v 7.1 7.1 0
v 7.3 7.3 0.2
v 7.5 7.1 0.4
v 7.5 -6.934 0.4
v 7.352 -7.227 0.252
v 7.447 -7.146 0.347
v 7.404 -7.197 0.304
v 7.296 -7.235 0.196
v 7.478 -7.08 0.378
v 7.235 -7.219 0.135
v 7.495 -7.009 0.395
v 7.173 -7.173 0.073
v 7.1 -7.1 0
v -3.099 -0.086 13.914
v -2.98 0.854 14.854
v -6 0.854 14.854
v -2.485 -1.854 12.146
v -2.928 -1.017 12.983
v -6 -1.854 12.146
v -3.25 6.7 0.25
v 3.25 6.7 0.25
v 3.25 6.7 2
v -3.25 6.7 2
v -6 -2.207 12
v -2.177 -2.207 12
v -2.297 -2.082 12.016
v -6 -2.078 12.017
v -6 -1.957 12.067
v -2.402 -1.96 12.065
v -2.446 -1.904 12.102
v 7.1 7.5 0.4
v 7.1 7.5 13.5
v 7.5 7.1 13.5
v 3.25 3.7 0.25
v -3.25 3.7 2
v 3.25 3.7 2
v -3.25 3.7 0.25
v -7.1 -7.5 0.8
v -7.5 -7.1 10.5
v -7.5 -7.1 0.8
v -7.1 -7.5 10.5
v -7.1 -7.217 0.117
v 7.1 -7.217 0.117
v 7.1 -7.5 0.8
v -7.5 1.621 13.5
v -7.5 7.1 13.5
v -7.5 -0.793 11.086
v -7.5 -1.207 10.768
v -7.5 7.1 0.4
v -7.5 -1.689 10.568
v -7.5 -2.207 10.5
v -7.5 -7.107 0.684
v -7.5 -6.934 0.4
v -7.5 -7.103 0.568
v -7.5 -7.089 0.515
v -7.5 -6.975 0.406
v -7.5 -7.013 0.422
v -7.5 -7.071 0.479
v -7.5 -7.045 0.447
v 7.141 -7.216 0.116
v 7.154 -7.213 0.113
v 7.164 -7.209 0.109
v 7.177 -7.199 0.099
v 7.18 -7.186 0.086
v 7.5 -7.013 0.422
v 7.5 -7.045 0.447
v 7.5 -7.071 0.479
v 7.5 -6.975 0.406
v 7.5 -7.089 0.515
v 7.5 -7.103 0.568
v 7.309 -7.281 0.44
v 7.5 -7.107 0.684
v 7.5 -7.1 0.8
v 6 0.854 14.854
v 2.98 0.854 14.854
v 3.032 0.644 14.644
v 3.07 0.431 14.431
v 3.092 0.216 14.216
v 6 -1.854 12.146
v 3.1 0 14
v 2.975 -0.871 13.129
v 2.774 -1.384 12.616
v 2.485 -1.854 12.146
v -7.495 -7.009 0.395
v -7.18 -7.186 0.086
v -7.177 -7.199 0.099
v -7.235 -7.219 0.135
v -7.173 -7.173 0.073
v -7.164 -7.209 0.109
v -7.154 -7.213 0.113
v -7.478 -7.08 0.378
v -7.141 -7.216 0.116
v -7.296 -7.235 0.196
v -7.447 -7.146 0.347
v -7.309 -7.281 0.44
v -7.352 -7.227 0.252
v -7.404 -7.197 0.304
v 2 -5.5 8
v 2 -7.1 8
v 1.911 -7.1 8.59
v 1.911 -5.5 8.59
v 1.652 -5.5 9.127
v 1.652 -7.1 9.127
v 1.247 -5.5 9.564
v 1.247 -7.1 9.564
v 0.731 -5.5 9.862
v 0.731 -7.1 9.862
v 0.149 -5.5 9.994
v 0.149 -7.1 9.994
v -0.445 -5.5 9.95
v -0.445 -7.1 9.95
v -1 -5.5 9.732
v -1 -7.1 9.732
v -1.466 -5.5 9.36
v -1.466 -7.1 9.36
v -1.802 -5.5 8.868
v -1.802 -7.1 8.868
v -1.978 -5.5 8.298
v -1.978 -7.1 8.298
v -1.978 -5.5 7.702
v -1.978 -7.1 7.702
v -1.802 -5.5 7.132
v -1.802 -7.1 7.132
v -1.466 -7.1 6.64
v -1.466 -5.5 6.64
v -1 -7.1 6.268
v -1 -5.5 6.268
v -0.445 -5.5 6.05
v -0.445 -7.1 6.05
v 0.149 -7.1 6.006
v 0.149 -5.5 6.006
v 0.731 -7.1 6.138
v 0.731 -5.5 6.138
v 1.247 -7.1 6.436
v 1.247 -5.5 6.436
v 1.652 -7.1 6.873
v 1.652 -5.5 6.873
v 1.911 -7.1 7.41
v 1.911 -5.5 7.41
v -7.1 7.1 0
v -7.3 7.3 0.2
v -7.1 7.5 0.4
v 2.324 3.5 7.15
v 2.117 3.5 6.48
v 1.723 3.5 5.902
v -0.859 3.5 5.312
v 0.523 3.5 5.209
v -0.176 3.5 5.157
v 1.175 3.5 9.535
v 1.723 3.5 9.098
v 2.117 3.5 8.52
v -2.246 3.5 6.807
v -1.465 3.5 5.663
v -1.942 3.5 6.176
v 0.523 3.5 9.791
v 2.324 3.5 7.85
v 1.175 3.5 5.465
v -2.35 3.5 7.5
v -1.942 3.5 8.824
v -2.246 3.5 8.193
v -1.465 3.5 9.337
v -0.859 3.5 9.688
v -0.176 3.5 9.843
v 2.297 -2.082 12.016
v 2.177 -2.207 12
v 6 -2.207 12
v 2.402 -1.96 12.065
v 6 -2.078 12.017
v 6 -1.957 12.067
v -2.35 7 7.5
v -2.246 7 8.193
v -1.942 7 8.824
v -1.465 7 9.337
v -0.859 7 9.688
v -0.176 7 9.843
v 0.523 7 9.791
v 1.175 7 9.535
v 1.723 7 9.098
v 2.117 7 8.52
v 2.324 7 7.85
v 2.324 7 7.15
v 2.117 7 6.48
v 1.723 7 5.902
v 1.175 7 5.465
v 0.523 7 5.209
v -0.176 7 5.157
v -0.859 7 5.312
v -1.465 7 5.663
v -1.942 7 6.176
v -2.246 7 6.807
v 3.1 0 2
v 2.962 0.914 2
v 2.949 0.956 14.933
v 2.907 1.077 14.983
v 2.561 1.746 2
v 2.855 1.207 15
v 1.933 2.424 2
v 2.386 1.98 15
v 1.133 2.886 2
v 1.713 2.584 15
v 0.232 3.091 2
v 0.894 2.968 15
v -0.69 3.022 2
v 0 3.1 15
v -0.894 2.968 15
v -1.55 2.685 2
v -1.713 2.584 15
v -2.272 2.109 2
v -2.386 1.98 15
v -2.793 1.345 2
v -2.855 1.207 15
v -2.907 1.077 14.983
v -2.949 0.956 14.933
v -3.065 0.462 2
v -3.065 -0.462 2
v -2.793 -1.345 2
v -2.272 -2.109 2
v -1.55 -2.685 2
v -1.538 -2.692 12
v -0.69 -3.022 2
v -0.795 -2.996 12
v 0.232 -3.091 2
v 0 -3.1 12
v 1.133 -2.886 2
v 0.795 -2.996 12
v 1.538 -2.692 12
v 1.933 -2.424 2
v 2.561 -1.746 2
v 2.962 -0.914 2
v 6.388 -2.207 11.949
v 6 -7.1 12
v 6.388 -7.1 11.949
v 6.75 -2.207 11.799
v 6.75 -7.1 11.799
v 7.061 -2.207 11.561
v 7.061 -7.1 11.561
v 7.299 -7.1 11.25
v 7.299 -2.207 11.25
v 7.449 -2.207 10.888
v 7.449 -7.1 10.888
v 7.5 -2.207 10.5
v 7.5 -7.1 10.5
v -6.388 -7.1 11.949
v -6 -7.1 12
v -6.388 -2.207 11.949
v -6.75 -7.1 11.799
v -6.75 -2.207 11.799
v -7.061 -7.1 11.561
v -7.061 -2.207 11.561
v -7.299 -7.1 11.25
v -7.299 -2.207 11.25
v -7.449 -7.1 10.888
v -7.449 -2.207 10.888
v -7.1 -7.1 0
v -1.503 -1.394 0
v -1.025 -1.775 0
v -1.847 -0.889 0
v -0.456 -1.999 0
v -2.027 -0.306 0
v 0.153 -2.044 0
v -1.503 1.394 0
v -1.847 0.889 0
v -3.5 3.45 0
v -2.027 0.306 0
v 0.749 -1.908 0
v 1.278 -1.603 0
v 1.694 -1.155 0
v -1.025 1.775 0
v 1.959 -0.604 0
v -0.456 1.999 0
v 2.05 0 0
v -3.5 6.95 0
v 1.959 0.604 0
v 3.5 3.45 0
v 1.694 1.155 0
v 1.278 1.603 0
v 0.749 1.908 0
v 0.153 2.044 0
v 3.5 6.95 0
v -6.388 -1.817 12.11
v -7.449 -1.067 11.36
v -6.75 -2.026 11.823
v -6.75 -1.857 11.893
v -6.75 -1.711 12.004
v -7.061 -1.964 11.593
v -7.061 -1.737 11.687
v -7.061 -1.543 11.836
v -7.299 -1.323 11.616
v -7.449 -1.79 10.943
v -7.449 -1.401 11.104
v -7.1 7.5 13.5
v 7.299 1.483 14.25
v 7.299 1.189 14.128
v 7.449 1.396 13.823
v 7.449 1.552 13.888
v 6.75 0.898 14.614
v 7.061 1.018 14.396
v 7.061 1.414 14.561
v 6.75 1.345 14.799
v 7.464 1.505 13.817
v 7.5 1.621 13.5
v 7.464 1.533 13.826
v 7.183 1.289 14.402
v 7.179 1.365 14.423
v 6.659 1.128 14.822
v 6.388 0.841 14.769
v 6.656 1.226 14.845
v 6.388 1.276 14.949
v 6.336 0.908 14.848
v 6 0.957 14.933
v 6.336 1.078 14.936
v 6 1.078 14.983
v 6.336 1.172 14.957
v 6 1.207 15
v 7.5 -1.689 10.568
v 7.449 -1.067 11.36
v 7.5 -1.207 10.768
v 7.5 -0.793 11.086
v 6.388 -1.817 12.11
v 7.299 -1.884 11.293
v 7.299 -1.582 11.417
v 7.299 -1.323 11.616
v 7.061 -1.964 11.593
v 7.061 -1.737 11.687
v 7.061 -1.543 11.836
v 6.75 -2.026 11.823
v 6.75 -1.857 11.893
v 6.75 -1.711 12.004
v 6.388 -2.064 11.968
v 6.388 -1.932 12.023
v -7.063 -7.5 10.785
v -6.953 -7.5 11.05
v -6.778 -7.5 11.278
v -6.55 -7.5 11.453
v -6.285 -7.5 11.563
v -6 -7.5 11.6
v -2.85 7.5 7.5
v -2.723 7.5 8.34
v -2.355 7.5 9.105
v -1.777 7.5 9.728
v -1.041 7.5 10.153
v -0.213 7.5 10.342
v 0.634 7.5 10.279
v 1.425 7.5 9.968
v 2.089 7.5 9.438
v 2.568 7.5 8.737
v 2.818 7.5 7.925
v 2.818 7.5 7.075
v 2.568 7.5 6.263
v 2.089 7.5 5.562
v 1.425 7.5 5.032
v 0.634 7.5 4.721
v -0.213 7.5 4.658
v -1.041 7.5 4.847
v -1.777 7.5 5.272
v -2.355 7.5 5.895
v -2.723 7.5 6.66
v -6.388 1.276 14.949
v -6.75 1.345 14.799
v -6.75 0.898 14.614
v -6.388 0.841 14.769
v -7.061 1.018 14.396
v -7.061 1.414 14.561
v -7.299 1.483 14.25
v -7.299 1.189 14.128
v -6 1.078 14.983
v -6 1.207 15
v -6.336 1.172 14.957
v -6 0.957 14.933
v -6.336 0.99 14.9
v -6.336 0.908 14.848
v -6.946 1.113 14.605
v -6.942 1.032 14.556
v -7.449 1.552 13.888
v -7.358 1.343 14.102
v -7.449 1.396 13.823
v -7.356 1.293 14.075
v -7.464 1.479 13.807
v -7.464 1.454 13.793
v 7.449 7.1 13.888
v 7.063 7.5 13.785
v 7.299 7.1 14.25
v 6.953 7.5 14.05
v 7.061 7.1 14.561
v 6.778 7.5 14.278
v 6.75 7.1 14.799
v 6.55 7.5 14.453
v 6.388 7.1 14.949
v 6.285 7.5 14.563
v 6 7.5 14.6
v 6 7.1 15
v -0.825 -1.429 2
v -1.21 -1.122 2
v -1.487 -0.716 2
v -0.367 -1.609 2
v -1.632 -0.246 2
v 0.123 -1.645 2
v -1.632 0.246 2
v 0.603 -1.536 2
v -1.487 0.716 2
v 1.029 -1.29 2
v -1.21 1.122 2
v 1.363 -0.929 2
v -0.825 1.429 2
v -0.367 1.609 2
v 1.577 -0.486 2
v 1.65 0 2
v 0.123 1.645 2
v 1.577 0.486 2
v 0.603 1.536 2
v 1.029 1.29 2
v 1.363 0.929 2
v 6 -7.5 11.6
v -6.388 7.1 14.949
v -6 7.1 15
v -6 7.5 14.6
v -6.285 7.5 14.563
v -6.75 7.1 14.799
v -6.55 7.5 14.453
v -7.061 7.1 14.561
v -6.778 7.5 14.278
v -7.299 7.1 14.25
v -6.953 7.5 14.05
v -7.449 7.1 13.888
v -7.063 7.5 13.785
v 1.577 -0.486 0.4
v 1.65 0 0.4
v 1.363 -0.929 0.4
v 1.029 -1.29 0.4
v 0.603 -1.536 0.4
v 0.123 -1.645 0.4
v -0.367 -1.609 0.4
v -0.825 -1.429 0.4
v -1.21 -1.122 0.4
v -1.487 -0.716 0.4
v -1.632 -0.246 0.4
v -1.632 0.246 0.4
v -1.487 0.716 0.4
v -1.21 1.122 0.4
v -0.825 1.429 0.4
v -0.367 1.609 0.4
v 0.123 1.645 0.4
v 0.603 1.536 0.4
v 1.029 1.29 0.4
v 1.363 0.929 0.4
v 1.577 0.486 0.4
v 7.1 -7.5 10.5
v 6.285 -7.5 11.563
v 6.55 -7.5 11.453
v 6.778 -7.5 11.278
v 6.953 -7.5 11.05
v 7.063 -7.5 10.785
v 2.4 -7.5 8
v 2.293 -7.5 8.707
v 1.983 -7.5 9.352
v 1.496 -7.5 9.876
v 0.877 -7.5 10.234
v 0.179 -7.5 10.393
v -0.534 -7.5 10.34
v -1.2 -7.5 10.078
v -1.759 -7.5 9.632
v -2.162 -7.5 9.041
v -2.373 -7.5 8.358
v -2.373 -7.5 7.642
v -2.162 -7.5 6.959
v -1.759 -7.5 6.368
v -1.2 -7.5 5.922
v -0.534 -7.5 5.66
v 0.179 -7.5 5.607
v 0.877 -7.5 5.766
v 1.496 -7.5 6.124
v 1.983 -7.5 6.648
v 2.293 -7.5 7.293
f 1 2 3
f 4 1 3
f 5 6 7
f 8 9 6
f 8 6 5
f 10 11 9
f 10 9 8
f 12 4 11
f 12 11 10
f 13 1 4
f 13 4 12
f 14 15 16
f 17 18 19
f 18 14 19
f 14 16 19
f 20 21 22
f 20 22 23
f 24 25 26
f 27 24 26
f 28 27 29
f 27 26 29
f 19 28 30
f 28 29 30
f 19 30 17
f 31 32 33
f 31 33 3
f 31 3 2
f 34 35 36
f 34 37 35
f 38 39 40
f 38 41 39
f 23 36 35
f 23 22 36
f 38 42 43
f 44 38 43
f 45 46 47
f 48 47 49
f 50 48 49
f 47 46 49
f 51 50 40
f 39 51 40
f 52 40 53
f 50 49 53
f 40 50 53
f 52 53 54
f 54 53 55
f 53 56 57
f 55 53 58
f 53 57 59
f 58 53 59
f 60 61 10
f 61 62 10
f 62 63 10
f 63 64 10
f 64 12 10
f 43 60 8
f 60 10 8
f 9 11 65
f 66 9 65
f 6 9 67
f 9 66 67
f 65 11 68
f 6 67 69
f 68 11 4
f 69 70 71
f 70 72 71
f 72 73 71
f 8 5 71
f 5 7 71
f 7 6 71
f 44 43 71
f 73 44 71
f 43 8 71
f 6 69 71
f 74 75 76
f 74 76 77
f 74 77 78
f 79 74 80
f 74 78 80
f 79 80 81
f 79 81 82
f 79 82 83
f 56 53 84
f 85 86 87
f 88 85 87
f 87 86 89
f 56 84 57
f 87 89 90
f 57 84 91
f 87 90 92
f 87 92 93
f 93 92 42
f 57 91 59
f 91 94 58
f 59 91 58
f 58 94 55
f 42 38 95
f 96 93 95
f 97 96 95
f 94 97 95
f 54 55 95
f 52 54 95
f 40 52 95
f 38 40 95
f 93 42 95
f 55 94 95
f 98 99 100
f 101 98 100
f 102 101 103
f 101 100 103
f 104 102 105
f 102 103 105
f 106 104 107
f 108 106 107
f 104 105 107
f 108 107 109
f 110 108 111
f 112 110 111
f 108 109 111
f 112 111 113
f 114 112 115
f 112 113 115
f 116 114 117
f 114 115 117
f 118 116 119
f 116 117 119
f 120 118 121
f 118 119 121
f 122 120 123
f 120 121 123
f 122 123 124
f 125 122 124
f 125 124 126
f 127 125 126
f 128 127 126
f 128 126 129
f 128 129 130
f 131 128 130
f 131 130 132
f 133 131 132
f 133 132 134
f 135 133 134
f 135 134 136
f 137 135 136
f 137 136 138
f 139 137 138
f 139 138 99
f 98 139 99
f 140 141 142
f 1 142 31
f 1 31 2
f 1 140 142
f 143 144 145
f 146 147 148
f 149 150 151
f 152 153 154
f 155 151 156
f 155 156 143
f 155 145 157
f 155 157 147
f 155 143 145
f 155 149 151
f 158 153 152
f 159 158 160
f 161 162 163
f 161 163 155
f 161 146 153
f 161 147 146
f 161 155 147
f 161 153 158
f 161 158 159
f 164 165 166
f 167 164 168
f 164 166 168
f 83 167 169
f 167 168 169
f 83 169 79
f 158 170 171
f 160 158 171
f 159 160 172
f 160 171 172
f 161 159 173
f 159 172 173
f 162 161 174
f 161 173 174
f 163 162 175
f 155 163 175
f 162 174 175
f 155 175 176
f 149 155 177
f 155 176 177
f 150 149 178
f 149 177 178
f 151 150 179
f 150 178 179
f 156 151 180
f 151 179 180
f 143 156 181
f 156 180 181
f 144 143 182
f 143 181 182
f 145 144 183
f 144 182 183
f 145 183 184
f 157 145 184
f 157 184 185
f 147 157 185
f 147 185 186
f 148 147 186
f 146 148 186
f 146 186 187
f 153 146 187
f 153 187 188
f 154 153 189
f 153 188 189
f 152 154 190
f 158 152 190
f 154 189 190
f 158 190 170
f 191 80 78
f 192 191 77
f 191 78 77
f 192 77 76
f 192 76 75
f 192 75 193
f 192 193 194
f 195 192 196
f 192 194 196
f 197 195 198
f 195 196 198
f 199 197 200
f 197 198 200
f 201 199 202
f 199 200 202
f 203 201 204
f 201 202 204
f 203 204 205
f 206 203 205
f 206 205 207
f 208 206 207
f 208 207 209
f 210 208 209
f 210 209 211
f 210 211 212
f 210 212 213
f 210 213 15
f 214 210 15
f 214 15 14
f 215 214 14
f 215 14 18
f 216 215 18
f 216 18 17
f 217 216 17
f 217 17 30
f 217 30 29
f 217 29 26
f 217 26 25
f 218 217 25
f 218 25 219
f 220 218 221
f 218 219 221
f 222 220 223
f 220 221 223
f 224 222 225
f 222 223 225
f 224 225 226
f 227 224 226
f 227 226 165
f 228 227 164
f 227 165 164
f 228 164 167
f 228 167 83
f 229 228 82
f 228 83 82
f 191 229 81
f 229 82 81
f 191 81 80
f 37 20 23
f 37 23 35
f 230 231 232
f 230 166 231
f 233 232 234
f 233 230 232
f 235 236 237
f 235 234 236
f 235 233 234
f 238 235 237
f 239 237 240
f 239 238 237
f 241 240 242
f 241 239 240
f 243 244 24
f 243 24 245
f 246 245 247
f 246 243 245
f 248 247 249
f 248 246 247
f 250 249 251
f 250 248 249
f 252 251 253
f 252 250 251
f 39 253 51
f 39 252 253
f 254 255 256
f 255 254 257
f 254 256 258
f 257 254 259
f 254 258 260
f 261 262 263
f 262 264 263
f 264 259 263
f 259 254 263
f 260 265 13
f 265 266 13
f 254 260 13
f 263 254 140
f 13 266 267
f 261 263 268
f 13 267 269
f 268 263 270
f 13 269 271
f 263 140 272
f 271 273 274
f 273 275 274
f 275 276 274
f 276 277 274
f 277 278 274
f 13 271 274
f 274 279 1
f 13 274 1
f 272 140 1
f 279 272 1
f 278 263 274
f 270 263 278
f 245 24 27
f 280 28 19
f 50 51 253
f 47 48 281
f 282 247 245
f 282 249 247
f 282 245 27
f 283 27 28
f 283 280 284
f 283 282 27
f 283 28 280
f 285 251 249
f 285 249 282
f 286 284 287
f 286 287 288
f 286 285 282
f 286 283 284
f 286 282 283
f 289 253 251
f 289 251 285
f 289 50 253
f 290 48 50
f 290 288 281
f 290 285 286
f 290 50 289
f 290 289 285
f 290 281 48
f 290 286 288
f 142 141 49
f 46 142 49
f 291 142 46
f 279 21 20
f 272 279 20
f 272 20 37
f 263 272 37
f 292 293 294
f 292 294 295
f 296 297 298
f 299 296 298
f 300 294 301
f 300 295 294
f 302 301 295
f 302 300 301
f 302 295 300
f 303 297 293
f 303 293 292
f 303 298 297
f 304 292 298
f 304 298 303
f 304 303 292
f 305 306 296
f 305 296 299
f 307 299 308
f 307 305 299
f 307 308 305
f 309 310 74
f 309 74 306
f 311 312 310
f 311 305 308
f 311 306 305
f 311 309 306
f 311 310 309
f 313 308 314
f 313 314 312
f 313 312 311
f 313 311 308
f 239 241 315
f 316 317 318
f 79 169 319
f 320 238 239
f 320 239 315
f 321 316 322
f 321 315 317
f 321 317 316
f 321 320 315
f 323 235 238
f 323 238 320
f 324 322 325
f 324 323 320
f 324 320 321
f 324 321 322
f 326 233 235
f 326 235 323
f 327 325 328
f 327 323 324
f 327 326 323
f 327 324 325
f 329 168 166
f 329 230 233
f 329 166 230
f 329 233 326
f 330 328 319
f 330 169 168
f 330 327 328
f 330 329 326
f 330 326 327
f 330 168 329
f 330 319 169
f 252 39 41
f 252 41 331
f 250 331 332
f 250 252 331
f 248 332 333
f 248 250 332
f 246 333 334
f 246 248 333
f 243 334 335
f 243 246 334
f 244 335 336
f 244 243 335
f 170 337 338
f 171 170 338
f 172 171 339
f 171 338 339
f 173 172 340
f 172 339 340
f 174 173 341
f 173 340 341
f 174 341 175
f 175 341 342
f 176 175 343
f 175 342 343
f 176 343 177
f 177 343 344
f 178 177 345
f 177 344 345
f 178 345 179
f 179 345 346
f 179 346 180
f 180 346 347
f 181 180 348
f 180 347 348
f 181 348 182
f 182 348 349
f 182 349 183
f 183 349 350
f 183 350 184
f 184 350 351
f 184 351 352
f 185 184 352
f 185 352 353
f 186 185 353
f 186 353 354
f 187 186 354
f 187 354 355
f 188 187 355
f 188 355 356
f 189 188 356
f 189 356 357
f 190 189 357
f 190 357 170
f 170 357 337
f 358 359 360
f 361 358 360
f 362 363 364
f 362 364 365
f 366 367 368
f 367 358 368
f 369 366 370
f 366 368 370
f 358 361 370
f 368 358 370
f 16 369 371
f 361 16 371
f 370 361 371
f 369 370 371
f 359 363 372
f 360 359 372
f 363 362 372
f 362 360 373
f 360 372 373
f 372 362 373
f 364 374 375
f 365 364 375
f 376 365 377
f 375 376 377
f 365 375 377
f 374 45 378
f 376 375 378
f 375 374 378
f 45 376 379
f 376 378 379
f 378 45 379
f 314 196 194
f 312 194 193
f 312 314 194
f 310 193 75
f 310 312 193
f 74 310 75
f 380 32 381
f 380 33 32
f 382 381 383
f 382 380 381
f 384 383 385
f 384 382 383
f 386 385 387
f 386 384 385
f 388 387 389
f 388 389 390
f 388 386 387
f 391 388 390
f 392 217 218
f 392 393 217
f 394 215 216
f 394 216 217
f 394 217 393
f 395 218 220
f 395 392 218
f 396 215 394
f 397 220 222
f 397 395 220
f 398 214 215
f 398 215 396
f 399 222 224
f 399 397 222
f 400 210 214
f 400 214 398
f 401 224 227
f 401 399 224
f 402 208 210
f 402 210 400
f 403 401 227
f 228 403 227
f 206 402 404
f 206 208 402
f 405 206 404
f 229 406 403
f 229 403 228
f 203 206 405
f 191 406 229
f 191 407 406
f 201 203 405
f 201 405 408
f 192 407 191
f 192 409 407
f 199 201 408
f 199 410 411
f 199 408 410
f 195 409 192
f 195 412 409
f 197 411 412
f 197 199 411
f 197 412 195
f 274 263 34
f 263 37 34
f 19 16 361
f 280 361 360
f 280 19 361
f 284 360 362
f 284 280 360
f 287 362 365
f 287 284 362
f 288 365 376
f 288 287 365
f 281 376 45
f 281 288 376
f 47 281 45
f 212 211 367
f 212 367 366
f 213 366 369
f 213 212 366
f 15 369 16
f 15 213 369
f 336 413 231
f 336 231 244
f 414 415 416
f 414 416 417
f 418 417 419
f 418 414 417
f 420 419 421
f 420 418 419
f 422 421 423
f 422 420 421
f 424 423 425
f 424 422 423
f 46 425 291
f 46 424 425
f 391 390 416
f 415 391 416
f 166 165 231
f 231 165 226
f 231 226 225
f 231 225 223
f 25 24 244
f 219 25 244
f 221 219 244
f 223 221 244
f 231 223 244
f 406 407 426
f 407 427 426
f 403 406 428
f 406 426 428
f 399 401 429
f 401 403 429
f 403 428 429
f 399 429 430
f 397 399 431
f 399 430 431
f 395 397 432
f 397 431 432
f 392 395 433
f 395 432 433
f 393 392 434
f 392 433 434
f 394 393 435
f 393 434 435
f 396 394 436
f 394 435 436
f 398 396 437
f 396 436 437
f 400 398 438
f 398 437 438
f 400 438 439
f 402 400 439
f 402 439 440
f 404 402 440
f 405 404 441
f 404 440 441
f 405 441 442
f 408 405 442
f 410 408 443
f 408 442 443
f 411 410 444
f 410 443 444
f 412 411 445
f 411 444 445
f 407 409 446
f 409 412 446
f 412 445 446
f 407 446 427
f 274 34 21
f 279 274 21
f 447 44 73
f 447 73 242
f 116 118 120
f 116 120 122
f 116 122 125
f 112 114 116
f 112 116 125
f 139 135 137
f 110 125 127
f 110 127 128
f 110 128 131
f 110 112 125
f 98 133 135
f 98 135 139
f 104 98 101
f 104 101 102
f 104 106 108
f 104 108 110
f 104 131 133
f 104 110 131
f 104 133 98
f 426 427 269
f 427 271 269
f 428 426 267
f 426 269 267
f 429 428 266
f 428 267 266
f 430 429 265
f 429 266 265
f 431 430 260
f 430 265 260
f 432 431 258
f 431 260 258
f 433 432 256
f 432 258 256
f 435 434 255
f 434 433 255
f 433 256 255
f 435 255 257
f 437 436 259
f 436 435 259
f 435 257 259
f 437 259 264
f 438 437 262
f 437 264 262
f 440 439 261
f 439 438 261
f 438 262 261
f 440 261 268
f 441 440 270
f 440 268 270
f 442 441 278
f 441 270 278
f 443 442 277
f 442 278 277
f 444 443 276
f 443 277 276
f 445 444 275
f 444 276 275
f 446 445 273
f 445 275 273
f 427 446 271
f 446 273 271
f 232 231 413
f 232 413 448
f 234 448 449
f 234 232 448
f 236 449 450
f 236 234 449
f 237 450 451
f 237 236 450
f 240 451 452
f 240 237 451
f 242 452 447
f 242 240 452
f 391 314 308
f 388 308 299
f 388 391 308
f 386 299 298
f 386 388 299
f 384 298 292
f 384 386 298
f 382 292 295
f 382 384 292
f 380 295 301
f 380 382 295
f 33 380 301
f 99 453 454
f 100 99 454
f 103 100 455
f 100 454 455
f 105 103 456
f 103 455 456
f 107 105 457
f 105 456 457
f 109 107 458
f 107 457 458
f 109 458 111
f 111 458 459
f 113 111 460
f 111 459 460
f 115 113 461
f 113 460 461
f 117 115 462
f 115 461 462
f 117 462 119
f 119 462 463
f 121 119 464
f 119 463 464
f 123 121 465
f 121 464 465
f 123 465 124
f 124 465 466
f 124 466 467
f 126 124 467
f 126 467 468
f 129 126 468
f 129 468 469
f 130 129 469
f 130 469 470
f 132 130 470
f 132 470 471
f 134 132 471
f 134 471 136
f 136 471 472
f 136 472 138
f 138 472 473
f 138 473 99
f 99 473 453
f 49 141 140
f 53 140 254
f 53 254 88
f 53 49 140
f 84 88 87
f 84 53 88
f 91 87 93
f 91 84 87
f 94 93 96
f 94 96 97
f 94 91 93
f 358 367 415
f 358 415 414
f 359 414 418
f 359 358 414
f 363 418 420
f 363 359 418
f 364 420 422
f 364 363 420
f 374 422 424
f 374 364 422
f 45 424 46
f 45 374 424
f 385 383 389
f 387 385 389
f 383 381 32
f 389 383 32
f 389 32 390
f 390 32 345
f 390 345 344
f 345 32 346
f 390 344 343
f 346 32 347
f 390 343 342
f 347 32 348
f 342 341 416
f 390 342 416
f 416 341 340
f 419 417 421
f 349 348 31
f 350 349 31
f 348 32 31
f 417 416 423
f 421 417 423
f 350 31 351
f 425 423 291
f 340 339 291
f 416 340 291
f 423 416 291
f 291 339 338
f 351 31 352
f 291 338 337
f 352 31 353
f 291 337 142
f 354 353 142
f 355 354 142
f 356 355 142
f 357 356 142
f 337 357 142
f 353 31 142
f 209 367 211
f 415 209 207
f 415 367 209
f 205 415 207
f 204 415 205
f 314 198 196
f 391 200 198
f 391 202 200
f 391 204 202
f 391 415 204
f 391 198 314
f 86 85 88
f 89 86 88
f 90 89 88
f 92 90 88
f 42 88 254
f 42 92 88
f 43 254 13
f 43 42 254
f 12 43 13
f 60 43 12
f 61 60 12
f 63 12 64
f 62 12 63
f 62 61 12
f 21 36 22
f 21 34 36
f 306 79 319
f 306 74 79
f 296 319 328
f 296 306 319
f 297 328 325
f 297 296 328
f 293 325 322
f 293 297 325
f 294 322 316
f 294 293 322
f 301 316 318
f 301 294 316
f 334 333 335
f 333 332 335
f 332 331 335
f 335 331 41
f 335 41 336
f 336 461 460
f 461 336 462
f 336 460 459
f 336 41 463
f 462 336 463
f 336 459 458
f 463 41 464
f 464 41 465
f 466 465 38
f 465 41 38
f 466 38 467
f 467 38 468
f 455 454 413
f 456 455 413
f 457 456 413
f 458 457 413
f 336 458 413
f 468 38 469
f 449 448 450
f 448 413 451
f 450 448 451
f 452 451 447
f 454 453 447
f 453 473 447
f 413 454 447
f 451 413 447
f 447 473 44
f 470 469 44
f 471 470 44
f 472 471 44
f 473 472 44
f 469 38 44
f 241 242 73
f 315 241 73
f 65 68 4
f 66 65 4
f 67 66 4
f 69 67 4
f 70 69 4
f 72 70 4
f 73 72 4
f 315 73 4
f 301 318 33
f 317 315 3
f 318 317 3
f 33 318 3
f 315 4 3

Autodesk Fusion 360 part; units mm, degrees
sketch "Sketch1" plane through (0, 0, 0) normal (0, 0, 1) x (1, 0, 0)
  line L0 (7.5, 7.5) -> (-7.5, 7.5)
  line L1 (-7.5, 7.5) -> (-7.5, -7.5)
  line L2 (-7.5, -7.5) -> (7.5, -7.5)
  line L3 (7.5, -7.5) -> (7.5, 7.5)
  line L4 (7.5, 7.5) -> (-7.5, -7.5) construction
  line L5 (-7.5, 7.5) -> (7.5, -7.5) construction
  circle A0 centre (0, 0) radius 1.65
  circle A1 centre (0, 0) radius 3.1
  dimension "d1" = 15
  dimension "d2" = 15
  dimension "d3" = 3.3
  dimension "d9" = 6.2
extrude "Extrude1" add sketch "Sketch1" along normal blind 15 contours L0 L1 L2 L3 | A1
sketch "Sketch2" plane through (0, 7.5, 0) normal (0, 1, 0) x (-1, 0, 0)
  line L0 (-7.5, 0) -> (7.5, 0)
  line L1 (7.5, 0) -> (7.5, 15)
  line L2 (7.5, 15) -> (-7.5, 15)
  line L3 (-7.5, 15) -> (-7.5, 0)
  circle A0 centre (0, 7.5) radius 2.35
  dimension "d6" = 4.7
extrude "Extrude2" cut sketch "Sketch2" against normal blind 4 contours A0
sketch "Sketch3" plane through (0, 0, 15) normal (0, 0, 1) x (1, 0, 0)
  circle A0 centre (0, 0) radius 1.65
  line L0 (7.5, -7.5) -> (7.5, 7.5)
  line L1 (7.5, 7.5) -> (-7.5, 7.5)
  line L2 (-7.5, 7.5) -> (-7.5, -7.5)
  line L3 (-7.5, -7.5) -> (7.5, -7.5)
  circle A1 centre (0, 0) radius 3.1
extrude "Extrude3" cut sketch "Sketch3" against normal blind 13 contours A1
sketch "Sketch4" plane through (-7.5, 0, 0) normal (-1, 0, 0) x (0, 0, 1)
  line L0 (0, 7.5) -> (0, -7.5)
  line L1 (0, -7.5) -> (15, -7.5)
  line L2 (15, -7.5) -> (15, 7.5)
  line L3 (15, 7.5) -> (0, 7.5)
  line L4 (15, 1) -> (12, -2)
  line L5 (0, -7.5) -> (12, -7.5)
  line L6 (15, 1) -> (15, 7.5)
  line L7 (5.15, 3.5) -> (9.85, 3.5)
  line L8 (5.15, 7.5) -> (9.85, 7.5)
  line L9 (12, -4) -> (0, -4)
  line L10 (12, -2) -> (12, -4)
  line L11 (12, -4) -> (12, -7.5)
  dimension "d12" = 12
  dimension "d20" = 3
  dimension "d21" = 3.5
  dimension "d22" = 135
  dimension "d23" = 5.5
extrude "Extrude4" cut sketch "Sketch4" against normal blind 186 contours L1 L2 L4 L10 L11
fillet "Fillet1" radius 0.5 4 edges at (-5.2171, 1, 15) (5.2171, 1, 15) (4.9343, -2, 12) (-4.9343, -2, 12)
fillet "Fillet2" radius 1.5 10 edges at (7.5, 4.3536, 15) (7.5, 1.0158, 14.9619) (7.5, -0.5, 13.5) (7.5, -2.0158, 12.0381) (7.5, -4.8536, 12) (-7.5, 4.3536, 15) (-7.5, 1.0158, 14.9619) (-7.5, -0.5, 13.5) (-7.5, -2.0158, 12.0381) (-7.5, -4.8536, 12)
chamfer "Chamfer2" distance 0.5 angle 45 1 edges at (2.191, 7.5, 8.3498)
chamfer "Chamfer1" distance 0.4 angle 45 1 faces at (0.0411, -5.5485, 0)
chamfer "Chamfer3" distance 0.4 angle 45 1 faces at (2, -7.5, 4.2667)
sketch "Sketch5" plane through (0, -7.5, 0) normal (0, -1, 0) x (1, 0, 0)
  line L0 (7.1, 0.8) -> (7.1, 10.5)
  line L1 (-7.1, 10.5) -> (-7.1, 0.8)
  line L2 (-7.1, 0.8) -> (7.1, 0.8)
  circle A0 centre (0, 8) radius 2
  line L3 (-7.1, 0) -> (7.1, 0)
  arc A1 (7.1, 10.5) -> (6, 11.6) centre (6, 10.5) ccw
  line L4 (6, 11.6) -> (-6, 11.6)
  arc A2 (-6, 11.6) -> (-7.1, 10.5) centre (-6, 10.5) ccw
  line L5 (6, 12) -> (-6, 12)
  dimension "d28" = 8
  dimension "d29" = 4
  dimension "d34" = 4
extrude "Extrude5" cut sketch "Sketch5" against normal blind 2 contours A0
chamfer "Chamfer4" distance 0.4 angle 45 6 edges at (-1.8647, -7.5, 8.7232) (7.5, 7.5, 6.95) (7.0607, 7.5, 14.5607) (0, 7.5, 15) (-7.0607, 7.5, 14.5607) (-7.5, 7.5, 6.95)
sketch "Sketch6" plane through (0, 0, 0) normal (0, 0, -1) x (-1, 0, 0)
  circle A0 centre (0, 0) radius 2.05
  line L0 (-7.1, 7.1) -> (-7.1, -7.1)
  line L1 (-7.1, -7.1) -> (7.1, -7.1)
  line L2 (7.1, -7.1) -> (7.1, 7.1)
  line L3 (7.1, 7.1) -> (-7.1, 7.1)
  line L4 (-3.25, 6.7) -> (3.25, 6.7)
  line L5 (3.25, 6.7) -> (3.25, 3.7)
  line L6 (3.25, 3.7) -> (-3.25, 3.7)
  line L7 (-3.25, 3.7) -> (-3.25, 6.7)
  line L8 (-7.5, 7.1) -> (-7.5, -7.1)
  line L9 (7.1, 7.5) -> (-7.1, 7.5)
  dimension "d35" = 6.5
  dimension "d36" = 3
  dimension "d37" = 4.25
  dimension "d38" = 0.8
extrude "Extrude6" cut sketch "Sketch6" against normal blind 2 contours L4 L5 L6 L7
chamfer "Chamfer5" distance 0.25 angle 45 4 edges at (-3.25, 5.2, 0) (0, 6.7, 0) (0, 3.7, 0) (3.25, 5.2, 0)
equation "d10 = -15 mm + 2 mm"
